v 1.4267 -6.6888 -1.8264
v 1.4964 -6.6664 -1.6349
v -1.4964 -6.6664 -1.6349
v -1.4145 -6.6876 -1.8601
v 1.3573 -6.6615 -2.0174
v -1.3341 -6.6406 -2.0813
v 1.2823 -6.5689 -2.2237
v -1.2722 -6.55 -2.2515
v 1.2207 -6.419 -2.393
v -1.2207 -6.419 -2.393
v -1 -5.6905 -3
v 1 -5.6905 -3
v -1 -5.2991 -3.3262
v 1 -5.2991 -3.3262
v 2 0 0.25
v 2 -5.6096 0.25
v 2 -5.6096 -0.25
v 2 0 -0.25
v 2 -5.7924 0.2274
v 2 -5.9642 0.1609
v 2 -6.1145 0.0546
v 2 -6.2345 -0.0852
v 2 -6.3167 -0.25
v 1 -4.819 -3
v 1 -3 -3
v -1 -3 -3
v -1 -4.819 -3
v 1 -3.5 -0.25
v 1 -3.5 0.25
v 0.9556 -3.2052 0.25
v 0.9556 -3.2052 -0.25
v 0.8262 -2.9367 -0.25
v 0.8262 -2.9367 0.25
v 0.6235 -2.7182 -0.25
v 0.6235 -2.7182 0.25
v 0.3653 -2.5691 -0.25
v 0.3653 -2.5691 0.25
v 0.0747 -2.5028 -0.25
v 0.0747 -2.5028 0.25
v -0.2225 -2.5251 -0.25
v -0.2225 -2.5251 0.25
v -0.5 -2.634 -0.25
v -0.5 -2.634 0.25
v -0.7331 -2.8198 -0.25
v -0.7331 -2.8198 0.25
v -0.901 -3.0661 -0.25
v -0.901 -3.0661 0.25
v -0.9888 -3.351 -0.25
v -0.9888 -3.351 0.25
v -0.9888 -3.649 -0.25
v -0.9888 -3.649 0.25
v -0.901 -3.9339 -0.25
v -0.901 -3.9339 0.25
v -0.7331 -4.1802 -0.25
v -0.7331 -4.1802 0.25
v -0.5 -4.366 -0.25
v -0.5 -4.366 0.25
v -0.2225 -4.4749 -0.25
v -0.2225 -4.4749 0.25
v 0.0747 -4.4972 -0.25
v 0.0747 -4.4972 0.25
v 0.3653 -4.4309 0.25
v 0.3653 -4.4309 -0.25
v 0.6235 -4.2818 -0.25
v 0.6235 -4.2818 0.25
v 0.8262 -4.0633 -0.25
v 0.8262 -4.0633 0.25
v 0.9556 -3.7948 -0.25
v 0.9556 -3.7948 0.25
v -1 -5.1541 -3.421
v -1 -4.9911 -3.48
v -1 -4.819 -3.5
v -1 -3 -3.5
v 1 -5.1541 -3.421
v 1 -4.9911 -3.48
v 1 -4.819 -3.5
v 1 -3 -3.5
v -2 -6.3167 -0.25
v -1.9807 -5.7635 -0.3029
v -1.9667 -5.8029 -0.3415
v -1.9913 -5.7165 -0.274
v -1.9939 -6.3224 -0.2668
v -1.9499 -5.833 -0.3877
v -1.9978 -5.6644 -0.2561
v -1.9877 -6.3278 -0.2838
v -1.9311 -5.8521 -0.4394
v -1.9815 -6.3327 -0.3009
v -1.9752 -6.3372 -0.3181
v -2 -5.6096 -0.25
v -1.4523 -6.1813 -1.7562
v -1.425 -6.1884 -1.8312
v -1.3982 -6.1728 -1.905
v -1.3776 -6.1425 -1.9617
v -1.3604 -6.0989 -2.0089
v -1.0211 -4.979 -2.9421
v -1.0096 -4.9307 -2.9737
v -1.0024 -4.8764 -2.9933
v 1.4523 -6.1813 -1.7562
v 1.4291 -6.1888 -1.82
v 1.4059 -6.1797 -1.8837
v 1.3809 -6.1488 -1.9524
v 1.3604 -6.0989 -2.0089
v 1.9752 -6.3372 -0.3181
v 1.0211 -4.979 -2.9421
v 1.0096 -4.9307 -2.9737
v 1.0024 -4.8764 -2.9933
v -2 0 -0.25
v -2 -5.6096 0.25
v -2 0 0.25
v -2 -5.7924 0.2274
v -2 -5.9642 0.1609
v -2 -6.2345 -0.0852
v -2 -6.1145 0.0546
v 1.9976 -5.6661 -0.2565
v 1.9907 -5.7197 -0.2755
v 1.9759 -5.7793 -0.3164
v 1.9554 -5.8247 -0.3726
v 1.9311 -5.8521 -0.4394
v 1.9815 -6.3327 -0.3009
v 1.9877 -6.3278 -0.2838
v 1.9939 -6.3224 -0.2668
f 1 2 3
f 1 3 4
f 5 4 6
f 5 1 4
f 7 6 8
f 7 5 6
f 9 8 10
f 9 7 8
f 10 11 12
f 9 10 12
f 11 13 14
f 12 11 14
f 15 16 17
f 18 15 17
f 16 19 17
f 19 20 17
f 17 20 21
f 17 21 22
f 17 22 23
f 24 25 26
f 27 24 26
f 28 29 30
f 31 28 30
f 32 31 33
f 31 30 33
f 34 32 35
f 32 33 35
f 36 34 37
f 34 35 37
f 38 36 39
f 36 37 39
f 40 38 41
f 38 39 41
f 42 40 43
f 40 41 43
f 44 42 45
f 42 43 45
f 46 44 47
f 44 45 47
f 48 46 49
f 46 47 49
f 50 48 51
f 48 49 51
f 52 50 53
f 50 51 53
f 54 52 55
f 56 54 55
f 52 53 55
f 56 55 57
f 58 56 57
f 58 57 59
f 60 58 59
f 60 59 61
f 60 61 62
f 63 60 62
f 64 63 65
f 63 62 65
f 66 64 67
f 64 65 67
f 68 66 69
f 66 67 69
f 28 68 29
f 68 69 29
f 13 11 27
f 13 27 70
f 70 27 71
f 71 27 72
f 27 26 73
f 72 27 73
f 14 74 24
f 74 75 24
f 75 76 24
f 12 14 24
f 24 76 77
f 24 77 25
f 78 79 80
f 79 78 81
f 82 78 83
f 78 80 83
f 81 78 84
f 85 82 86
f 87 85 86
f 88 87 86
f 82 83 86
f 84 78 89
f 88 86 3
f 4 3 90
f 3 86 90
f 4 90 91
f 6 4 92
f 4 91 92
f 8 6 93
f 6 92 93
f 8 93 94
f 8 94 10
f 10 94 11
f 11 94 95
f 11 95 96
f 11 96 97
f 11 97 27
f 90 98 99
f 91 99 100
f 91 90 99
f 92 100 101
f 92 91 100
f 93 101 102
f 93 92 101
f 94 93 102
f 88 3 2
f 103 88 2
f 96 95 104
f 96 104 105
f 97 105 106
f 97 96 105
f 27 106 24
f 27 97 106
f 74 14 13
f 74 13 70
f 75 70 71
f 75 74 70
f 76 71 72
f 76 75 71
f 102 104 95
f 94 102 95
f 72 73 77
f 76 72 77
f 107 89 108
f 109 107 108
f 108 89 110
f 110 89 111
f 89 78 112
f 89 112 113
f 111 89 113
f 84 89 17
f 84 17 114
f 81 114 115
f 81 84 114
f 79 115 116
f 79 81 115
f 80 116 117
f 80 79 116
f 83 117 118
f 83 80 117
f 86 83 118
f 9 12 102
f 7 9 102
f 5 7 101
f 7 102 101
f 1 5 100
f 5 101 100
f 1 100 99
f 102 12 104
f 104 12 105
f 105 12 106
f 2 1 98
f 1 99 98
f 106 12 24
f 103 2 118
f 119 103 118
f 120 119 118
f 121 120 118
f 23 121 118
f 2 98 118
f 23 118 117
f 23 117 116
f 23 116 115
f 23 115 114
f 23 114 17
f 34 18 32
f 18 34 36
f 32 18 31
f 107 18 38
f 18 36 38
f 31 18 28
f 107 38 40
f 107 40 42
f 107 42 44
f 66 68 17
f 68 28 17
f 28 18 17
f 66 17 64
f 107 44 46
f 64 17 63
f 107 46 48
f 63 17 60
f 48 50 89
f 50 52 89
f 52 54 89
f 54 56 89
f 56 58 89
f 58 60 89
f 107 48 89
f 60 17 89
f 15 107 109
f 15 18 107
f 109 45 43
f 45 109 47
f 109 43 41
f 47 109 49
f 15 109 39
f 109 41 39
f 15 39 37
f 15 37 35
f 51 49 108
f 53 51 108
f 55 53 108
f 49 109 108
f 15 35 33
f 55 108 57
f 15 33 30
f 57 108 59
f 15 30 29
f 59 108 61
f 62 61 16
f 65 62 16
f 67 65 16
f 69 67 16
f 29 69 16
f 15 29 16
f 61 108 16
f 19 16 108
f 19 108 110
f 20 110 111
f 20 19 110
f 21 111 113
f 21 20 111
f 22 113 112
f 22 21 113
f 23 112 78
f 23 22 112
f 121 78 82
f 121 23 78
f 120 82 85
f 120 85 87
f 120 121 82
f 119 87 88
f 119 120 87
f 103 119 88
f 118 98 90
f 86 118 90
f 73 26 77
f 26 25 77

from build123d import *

# Parameters (mm, degrees)
SKETCH1_W          = 4
SKETCH1_H          = 0.5
SKETCH6_OUTSIDE_W  = 7.73
SKETCH6_OUTSIDE_H  = 7.48
CUT_EXTRUDE1_DEPTH = 8.809622956
SKETCH7_R          = 1
CUT_EXTRUDE2_DEPTH = 0.5


with BuildPart() as part:
    # Sweep1: sweep along a path in Sketch2
    with BuildLine(Plane(origin=(0, 0, 0), x_dir=(0, 0, -1), z_dir=(1, 0, 0))) as sweep1_path:
        Line((0, 0), (0, -5.609611797))
        ThreePointArc((0, -5.609611797), (0.105897281, -5.917317901), (0.378732187, -6.094683047))
        Line((0.378732187, -6.094683047), (1.695534419, -6.423883605))
        ThreePointArc((1.695534419, -6.423883605), (1.971967014, -6.414126872), (2.200912871, -6.258904554))
        Line((2.200912871, -6.258904554), (3.13411064, -5.139067232))
        ThreePointArc((3.13411064, -5.139067232), (3.220135789, -4.989187664), (3.25, -4.818975032))
        Line((3.25, -4.818975032), (3.25, -3))
    # Sketch1 → Sweep1 (sweep)
    with BuildSketch(Plane(origin=(0, 0, 0), x_dir=(1, 0, 0), z_dir=(0, 1, 0))):
        Rectangle(SKETCH1_W, SKETCH1_H)
    sweep(path=sweep1_path.line)

    # Sketch6 outside → Cut-Extrude1 (cut, through all)
    with BuildSketch(Plane(origin=(0, 0, 0), x_dir=(1, 0, 0), z_dir=(0, 1, 0))):
        with Locations((0, 1.625)):
            Rectangle(SKETCH6_OUTSIDE_W, SKETCH6_OUTSIDE_H)
        Polygon((2, -0.25), (-2, -0.25), (-2, 0.25), (-1, 3), (-1, 3.5), (1, 3.5), (1, 3), (2, 0.25), align=None, mode=Mode.SUBTRACT)
    extrude(amount=-CUT_EXTRUDE1_DEPTH, mode=Mode.SUBTRACT)

    # Sketch7 → Cut-Extrude2 (cut)
    with BuildSketch(Plane.XY.offset(0.25)):
        with Locations((0, -3.5)):
            Circle(SKETCH7_R)
    extrude(amount=-CUT_EXTRUDE2_DEPTH, mode=Mode.SUBTRACT)


solid = part.part
